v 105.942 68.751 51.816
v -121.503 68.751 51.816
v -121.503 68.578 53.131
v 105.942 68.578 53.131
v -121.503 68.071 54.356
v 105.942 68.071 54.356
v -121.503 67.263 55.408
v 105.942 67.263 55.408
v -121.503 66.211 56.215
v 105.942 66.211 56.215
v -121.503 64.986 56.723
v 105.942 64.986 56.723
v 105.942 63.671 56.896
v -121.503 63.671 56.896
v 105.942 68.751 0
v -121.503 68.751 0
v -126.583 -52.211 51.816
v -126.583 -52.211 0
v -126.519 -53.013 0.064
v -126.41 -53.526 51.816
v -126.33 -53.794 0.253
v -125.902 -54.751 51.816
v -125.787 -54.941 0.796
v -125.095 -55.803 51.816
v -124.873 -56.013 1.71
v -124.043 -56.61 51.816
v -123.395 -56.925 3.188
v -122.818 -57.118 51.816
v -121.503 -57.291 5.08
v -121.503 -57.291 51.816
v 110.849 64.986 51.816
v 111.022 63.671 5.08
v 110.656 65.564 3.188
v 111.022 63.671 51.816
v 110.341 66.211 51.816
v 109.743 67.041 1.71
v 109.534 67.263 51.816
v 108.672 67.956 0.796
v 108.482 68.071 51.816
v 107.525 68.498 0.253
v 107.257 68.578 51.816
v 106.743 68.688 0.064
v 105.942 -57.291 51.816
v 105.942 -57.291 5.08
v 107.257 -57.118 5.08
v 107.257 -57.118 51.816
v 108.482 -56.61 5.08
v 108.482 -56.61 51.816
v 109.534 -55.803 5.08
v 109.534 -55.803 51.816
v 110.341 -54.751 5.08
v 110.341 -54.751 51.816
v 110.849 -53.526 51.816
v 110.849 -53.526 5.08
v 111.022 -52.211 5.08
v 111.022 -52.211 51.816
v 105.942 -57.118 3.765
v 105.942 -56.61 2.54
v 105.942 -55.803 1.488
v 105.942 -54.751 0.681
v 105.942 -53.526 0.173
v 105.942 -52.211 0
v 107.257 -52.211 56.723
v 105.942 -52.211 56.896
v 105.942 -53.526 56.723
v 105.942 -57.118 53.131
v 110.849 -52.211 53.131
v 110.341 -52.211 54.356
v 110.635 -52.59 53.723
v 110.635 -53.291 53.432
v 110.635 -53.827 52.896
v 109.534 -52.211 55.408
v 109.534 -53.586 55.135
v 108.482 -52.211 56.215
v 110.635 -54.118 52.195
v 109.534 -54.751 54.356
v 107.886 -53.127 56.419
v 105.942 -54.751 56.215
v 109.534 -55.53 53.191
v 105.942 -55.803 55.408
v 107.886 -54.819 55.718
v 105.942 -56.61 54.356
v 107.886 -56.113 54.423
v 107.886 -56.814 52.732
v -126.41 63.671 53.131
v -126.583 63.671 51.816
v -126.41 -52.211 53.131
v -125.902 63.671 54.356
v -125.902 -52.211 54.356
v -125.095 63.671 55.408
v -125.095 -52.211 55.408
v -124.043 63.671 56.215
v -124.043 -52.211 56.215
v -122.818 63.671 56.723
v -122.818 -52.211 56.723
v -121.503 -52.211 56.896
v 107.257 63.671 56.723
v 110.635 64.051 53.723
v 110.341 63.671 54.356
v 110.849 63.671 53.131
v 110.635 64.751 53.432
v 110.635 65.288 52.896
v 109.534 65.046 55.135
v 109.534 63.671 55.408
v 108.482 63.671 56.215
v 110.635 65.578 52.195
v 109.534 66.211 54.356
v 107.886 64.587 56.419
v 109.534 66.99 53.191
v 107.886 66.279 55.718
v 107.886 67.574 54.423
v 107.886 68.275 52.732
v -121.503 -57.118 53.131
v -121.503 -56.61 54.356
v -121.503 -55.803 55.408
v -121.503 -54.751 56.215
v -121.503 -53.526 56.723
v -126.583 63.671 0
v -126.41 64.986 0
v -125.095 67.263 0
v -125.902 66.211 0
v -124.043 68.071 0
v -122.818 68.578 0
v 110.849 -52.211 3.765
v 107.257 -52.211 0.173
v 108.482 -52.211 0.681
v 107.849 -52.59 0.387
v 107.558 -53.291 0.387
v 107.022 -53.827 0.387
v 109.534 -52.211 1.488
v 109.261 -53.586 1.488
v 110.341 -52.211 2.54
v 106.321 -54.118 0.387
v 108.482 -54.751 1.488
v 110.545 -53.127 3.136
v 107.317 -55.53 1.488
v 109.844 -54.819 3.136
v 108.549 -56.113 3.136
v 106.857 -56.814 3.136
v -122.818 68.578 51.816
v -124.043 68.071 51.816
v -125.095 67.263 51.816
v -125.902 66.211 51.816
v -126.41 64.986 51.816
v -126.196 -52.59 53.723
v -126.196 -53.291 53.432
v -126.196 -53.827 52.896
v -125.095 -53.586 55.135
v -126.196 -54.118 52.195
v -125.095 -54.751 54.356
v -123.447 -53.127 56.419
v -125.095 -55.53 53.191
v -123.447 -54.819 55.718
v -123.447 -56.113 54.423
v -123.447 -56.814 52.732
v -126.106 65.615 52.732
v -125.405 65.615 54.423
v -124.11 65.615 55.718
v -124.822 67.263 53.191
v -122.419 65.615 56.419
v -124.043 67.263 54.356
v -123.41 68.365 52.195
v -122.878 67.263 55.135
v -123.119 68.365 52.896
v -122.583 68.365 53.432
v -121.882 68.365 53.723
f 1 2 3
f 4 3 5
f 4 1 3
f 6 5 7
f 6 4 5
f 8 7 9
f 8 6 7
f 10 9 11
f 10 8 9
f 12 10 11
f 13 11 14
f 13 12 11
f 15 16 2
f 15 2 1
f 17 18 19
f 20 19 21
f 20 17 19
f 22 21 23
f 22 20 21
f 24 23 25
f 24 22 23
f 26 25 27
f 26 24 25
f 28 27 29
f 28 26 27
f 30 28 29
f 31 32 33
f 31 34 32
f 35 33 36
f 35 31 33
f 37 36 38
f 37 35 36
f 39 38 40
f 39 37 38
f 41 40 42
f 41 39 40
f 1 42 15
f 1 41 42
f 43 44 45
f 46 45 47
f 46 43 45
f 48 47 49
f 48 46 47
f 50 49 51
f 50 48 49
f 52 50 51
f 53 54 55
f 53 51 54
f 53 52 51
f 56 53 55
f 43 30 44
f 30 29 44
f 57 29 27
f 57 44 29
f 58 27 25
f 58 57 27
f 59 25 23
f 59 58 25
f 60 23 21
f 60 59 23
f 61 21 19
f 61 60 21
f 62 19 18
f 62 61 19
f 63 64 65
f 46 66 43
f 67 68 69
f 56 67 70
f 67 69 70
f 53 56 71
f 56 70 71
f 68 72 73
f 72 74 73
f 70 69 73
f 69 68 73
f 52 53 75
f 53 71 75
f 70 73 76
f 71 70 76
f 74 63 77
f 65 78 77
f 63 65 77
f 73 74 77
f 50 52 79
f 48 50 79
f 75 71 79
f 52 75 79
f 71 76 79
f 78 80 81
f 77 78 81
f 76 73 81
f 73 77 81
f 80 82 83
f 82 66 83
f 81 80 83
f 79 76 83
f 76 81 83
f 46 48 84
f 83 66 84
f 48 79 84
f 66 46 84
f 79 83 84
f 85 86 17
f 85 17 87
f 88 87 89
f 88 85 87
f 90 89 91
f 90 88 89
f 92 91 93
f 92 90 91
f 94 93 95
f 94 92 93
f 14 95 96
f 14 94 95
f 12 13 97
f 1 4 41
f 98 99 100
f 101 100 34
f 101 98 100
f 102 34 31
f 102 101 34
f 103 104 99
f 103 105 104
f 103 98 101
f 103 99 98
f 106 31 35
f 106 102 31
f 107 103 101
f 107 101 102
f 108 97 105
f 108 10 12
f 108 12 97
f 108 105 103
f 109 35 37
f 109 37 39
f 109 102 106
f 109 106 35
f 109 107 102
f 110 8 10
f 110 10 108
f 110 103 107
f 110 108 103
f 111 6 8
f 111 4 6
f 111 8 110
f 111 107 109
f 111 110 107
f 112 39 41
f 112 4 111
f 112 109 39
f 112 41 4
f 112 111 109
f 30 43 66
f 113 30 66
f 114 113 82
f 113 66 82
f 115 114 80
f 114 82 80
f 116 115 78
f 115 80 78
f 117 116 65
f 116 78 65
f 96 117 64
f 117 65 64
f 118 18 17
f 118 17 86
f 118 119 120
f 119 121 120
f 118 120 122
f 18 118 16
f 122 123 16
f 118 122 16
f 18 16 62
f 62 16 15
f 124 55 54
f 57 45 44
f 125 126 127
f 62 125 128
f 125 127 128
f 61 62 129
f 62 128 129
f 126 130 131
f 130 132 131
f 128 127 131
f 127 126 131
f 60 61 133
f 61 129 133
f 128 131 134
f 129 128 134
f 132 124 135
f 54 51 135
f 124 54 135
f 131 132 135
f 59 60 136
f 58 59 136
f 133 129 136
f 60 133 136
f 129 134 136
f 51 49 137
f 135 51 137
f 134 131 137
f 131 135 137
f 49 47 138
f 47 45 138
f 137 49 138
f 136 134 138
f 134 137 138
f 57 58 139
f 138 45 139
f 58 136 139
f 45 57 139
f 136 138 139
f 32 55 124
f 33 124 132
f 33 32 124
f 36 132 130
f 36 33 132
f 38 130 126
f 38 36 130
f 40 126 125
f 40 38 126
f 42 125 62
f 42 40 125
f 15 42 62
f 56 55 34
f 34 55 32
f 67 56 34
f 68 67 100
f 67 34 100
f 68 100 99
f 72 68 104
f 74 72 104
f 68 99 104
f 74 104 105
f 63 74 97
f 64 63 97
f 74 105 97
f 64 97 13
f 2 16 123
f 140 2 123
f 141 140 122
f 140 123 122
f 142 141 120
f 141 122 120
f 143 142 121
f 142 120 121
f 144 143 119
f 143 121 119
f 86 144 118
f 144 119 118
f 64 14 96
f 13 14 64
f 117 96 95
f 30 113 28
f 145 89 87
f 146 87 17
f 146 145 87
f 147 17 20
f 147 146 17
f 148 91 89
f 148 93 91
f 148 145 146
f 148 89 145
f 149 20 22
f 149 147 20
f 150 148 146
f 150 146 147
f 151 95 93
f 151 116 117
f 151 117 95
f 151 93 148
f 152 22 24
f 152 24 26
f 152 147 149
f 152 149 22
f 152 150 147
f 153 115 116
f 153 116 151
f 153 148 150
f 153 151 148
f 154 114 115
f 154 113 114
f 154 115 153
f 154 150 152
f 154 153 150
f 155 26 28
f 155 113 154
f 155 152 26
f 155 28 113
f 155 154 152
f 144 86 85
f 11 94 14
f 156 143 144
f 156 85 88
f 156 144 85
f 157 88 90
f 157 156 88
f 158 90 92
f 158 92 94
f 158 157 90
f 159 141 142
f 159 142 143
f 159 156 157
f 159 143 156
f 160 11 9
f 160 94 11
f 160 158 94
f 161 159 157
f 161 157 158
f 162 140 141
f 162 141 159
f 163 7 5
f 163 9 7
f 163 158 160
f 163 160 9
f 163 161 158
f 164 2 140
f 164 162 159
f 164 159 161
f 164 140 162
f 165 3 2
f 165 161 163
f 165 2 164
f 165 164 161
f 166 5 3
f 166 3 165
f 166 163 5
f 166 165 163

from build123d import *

# Parameters (mm, degrees)
F0_W        = 237.6048713923
F0_H        = 126.0424219072
F1_DEPTH    = 56.896
F2_R        = 5.08
F3_T1_DEPTH = 64.516
F3_S5_W     = 5.08
F3_S5_H     = 5.08
F3_T6_DEPTH = 5.08


# Not quite as in the source:
# - a fillet or chamfer that OpenCascade refuses, or shapes differently, is made with other operations: its cross-section is extruded or revolved along the edge and cut away or added


with BuildPart() as f1:
    # F0 (on Top) → F1 (new body)
    with BuildSketch(Plane.XY):
        with Locations((-7.780559361, 5.7301688939)):
            Rectangle(F0_W, F0_H)
    extrude(amount=F1_DEPTH)

    # F2
    f2_edges = [f1.edges().sort_by_distance(p)[0] for p in [
        (-7.780559, -57.291042, 56.896),
        (-126.582995, 5.730169, 56.896),
        (-7.780559, 68.75138, 56.896),
        (111.021876, 5.730169, 56.896),
        (111.021876, 68.75138, 28.448),
        (111.021876, -57.291042, 28.448),
        (111.021876, 5.730169, 0),
        (-7.780559, -57.291042, 0),
        (-126.582995, -57.291042, 28.448),
    ]]
    fillet(f2_edges, radius=F2_R)

    # F3: fillet of radius 5.08 on 1 edges, made by hand

    # F3_s2 → F3_t1 (cut)
    with BuildSketch(Plane.XY.offset(-12.7)):
        with BuildLine():
            ThreePointArc((-121.5029950571, 68.7513798475), (-125.0950975055, 67.263482296), (-126.5829950571, 63.6713798475))
            Line((-126.5829950571, 63.6713798475), (-126.5829950571, 68.7513798475))
            Line((-126.5829950571, 68.7513798475), (-121.5029950571, 68.7513798475))
        make_face()
    extrude(amount=F3_T1_DEPTH, mode=Mode.SUBTRACT)


with BuildPart() as f3_tool4:
    # F3_s5 → F3_t6 (new body)
    with BuildSketch(Plane.XZ.offset(-63.6713798475)):
        with Locations((-124.0429950571, 54.356)):
            Rectangle(F3_S5_W, F3_S5_H)
    extrude(amount=-F3_T6_DEPTH)

    # F3_s7 → F3_t8 (revolve, cut)
    with BuildSketch(Plane(origin=(-121.5029950571, 63.6713798475, 51.816), x_dir=(0.7071067812, 0, -0.7071067812), z_dir=(0.7071067812, 0, 0.7071067812))):
        with BuildLine():
            ThreePointArc((0, -5.08), (5.08, 0), (0, 5.08))
            Line((0, 5.08), (0, -5.08))
        make_face()
    revolve(axis=Axis((-121.5029950571, 63.6713798475, 51.816), (0, 1, 0)), mode=Mode.SUBTRACT)


with BuildPart() as f1_1:
    add(f1.part)

    # F3_t3: cut F3_tool4
    add(f3_tool4.part, mode=Mode.SUBTRACT)


solid = f1_1.part
